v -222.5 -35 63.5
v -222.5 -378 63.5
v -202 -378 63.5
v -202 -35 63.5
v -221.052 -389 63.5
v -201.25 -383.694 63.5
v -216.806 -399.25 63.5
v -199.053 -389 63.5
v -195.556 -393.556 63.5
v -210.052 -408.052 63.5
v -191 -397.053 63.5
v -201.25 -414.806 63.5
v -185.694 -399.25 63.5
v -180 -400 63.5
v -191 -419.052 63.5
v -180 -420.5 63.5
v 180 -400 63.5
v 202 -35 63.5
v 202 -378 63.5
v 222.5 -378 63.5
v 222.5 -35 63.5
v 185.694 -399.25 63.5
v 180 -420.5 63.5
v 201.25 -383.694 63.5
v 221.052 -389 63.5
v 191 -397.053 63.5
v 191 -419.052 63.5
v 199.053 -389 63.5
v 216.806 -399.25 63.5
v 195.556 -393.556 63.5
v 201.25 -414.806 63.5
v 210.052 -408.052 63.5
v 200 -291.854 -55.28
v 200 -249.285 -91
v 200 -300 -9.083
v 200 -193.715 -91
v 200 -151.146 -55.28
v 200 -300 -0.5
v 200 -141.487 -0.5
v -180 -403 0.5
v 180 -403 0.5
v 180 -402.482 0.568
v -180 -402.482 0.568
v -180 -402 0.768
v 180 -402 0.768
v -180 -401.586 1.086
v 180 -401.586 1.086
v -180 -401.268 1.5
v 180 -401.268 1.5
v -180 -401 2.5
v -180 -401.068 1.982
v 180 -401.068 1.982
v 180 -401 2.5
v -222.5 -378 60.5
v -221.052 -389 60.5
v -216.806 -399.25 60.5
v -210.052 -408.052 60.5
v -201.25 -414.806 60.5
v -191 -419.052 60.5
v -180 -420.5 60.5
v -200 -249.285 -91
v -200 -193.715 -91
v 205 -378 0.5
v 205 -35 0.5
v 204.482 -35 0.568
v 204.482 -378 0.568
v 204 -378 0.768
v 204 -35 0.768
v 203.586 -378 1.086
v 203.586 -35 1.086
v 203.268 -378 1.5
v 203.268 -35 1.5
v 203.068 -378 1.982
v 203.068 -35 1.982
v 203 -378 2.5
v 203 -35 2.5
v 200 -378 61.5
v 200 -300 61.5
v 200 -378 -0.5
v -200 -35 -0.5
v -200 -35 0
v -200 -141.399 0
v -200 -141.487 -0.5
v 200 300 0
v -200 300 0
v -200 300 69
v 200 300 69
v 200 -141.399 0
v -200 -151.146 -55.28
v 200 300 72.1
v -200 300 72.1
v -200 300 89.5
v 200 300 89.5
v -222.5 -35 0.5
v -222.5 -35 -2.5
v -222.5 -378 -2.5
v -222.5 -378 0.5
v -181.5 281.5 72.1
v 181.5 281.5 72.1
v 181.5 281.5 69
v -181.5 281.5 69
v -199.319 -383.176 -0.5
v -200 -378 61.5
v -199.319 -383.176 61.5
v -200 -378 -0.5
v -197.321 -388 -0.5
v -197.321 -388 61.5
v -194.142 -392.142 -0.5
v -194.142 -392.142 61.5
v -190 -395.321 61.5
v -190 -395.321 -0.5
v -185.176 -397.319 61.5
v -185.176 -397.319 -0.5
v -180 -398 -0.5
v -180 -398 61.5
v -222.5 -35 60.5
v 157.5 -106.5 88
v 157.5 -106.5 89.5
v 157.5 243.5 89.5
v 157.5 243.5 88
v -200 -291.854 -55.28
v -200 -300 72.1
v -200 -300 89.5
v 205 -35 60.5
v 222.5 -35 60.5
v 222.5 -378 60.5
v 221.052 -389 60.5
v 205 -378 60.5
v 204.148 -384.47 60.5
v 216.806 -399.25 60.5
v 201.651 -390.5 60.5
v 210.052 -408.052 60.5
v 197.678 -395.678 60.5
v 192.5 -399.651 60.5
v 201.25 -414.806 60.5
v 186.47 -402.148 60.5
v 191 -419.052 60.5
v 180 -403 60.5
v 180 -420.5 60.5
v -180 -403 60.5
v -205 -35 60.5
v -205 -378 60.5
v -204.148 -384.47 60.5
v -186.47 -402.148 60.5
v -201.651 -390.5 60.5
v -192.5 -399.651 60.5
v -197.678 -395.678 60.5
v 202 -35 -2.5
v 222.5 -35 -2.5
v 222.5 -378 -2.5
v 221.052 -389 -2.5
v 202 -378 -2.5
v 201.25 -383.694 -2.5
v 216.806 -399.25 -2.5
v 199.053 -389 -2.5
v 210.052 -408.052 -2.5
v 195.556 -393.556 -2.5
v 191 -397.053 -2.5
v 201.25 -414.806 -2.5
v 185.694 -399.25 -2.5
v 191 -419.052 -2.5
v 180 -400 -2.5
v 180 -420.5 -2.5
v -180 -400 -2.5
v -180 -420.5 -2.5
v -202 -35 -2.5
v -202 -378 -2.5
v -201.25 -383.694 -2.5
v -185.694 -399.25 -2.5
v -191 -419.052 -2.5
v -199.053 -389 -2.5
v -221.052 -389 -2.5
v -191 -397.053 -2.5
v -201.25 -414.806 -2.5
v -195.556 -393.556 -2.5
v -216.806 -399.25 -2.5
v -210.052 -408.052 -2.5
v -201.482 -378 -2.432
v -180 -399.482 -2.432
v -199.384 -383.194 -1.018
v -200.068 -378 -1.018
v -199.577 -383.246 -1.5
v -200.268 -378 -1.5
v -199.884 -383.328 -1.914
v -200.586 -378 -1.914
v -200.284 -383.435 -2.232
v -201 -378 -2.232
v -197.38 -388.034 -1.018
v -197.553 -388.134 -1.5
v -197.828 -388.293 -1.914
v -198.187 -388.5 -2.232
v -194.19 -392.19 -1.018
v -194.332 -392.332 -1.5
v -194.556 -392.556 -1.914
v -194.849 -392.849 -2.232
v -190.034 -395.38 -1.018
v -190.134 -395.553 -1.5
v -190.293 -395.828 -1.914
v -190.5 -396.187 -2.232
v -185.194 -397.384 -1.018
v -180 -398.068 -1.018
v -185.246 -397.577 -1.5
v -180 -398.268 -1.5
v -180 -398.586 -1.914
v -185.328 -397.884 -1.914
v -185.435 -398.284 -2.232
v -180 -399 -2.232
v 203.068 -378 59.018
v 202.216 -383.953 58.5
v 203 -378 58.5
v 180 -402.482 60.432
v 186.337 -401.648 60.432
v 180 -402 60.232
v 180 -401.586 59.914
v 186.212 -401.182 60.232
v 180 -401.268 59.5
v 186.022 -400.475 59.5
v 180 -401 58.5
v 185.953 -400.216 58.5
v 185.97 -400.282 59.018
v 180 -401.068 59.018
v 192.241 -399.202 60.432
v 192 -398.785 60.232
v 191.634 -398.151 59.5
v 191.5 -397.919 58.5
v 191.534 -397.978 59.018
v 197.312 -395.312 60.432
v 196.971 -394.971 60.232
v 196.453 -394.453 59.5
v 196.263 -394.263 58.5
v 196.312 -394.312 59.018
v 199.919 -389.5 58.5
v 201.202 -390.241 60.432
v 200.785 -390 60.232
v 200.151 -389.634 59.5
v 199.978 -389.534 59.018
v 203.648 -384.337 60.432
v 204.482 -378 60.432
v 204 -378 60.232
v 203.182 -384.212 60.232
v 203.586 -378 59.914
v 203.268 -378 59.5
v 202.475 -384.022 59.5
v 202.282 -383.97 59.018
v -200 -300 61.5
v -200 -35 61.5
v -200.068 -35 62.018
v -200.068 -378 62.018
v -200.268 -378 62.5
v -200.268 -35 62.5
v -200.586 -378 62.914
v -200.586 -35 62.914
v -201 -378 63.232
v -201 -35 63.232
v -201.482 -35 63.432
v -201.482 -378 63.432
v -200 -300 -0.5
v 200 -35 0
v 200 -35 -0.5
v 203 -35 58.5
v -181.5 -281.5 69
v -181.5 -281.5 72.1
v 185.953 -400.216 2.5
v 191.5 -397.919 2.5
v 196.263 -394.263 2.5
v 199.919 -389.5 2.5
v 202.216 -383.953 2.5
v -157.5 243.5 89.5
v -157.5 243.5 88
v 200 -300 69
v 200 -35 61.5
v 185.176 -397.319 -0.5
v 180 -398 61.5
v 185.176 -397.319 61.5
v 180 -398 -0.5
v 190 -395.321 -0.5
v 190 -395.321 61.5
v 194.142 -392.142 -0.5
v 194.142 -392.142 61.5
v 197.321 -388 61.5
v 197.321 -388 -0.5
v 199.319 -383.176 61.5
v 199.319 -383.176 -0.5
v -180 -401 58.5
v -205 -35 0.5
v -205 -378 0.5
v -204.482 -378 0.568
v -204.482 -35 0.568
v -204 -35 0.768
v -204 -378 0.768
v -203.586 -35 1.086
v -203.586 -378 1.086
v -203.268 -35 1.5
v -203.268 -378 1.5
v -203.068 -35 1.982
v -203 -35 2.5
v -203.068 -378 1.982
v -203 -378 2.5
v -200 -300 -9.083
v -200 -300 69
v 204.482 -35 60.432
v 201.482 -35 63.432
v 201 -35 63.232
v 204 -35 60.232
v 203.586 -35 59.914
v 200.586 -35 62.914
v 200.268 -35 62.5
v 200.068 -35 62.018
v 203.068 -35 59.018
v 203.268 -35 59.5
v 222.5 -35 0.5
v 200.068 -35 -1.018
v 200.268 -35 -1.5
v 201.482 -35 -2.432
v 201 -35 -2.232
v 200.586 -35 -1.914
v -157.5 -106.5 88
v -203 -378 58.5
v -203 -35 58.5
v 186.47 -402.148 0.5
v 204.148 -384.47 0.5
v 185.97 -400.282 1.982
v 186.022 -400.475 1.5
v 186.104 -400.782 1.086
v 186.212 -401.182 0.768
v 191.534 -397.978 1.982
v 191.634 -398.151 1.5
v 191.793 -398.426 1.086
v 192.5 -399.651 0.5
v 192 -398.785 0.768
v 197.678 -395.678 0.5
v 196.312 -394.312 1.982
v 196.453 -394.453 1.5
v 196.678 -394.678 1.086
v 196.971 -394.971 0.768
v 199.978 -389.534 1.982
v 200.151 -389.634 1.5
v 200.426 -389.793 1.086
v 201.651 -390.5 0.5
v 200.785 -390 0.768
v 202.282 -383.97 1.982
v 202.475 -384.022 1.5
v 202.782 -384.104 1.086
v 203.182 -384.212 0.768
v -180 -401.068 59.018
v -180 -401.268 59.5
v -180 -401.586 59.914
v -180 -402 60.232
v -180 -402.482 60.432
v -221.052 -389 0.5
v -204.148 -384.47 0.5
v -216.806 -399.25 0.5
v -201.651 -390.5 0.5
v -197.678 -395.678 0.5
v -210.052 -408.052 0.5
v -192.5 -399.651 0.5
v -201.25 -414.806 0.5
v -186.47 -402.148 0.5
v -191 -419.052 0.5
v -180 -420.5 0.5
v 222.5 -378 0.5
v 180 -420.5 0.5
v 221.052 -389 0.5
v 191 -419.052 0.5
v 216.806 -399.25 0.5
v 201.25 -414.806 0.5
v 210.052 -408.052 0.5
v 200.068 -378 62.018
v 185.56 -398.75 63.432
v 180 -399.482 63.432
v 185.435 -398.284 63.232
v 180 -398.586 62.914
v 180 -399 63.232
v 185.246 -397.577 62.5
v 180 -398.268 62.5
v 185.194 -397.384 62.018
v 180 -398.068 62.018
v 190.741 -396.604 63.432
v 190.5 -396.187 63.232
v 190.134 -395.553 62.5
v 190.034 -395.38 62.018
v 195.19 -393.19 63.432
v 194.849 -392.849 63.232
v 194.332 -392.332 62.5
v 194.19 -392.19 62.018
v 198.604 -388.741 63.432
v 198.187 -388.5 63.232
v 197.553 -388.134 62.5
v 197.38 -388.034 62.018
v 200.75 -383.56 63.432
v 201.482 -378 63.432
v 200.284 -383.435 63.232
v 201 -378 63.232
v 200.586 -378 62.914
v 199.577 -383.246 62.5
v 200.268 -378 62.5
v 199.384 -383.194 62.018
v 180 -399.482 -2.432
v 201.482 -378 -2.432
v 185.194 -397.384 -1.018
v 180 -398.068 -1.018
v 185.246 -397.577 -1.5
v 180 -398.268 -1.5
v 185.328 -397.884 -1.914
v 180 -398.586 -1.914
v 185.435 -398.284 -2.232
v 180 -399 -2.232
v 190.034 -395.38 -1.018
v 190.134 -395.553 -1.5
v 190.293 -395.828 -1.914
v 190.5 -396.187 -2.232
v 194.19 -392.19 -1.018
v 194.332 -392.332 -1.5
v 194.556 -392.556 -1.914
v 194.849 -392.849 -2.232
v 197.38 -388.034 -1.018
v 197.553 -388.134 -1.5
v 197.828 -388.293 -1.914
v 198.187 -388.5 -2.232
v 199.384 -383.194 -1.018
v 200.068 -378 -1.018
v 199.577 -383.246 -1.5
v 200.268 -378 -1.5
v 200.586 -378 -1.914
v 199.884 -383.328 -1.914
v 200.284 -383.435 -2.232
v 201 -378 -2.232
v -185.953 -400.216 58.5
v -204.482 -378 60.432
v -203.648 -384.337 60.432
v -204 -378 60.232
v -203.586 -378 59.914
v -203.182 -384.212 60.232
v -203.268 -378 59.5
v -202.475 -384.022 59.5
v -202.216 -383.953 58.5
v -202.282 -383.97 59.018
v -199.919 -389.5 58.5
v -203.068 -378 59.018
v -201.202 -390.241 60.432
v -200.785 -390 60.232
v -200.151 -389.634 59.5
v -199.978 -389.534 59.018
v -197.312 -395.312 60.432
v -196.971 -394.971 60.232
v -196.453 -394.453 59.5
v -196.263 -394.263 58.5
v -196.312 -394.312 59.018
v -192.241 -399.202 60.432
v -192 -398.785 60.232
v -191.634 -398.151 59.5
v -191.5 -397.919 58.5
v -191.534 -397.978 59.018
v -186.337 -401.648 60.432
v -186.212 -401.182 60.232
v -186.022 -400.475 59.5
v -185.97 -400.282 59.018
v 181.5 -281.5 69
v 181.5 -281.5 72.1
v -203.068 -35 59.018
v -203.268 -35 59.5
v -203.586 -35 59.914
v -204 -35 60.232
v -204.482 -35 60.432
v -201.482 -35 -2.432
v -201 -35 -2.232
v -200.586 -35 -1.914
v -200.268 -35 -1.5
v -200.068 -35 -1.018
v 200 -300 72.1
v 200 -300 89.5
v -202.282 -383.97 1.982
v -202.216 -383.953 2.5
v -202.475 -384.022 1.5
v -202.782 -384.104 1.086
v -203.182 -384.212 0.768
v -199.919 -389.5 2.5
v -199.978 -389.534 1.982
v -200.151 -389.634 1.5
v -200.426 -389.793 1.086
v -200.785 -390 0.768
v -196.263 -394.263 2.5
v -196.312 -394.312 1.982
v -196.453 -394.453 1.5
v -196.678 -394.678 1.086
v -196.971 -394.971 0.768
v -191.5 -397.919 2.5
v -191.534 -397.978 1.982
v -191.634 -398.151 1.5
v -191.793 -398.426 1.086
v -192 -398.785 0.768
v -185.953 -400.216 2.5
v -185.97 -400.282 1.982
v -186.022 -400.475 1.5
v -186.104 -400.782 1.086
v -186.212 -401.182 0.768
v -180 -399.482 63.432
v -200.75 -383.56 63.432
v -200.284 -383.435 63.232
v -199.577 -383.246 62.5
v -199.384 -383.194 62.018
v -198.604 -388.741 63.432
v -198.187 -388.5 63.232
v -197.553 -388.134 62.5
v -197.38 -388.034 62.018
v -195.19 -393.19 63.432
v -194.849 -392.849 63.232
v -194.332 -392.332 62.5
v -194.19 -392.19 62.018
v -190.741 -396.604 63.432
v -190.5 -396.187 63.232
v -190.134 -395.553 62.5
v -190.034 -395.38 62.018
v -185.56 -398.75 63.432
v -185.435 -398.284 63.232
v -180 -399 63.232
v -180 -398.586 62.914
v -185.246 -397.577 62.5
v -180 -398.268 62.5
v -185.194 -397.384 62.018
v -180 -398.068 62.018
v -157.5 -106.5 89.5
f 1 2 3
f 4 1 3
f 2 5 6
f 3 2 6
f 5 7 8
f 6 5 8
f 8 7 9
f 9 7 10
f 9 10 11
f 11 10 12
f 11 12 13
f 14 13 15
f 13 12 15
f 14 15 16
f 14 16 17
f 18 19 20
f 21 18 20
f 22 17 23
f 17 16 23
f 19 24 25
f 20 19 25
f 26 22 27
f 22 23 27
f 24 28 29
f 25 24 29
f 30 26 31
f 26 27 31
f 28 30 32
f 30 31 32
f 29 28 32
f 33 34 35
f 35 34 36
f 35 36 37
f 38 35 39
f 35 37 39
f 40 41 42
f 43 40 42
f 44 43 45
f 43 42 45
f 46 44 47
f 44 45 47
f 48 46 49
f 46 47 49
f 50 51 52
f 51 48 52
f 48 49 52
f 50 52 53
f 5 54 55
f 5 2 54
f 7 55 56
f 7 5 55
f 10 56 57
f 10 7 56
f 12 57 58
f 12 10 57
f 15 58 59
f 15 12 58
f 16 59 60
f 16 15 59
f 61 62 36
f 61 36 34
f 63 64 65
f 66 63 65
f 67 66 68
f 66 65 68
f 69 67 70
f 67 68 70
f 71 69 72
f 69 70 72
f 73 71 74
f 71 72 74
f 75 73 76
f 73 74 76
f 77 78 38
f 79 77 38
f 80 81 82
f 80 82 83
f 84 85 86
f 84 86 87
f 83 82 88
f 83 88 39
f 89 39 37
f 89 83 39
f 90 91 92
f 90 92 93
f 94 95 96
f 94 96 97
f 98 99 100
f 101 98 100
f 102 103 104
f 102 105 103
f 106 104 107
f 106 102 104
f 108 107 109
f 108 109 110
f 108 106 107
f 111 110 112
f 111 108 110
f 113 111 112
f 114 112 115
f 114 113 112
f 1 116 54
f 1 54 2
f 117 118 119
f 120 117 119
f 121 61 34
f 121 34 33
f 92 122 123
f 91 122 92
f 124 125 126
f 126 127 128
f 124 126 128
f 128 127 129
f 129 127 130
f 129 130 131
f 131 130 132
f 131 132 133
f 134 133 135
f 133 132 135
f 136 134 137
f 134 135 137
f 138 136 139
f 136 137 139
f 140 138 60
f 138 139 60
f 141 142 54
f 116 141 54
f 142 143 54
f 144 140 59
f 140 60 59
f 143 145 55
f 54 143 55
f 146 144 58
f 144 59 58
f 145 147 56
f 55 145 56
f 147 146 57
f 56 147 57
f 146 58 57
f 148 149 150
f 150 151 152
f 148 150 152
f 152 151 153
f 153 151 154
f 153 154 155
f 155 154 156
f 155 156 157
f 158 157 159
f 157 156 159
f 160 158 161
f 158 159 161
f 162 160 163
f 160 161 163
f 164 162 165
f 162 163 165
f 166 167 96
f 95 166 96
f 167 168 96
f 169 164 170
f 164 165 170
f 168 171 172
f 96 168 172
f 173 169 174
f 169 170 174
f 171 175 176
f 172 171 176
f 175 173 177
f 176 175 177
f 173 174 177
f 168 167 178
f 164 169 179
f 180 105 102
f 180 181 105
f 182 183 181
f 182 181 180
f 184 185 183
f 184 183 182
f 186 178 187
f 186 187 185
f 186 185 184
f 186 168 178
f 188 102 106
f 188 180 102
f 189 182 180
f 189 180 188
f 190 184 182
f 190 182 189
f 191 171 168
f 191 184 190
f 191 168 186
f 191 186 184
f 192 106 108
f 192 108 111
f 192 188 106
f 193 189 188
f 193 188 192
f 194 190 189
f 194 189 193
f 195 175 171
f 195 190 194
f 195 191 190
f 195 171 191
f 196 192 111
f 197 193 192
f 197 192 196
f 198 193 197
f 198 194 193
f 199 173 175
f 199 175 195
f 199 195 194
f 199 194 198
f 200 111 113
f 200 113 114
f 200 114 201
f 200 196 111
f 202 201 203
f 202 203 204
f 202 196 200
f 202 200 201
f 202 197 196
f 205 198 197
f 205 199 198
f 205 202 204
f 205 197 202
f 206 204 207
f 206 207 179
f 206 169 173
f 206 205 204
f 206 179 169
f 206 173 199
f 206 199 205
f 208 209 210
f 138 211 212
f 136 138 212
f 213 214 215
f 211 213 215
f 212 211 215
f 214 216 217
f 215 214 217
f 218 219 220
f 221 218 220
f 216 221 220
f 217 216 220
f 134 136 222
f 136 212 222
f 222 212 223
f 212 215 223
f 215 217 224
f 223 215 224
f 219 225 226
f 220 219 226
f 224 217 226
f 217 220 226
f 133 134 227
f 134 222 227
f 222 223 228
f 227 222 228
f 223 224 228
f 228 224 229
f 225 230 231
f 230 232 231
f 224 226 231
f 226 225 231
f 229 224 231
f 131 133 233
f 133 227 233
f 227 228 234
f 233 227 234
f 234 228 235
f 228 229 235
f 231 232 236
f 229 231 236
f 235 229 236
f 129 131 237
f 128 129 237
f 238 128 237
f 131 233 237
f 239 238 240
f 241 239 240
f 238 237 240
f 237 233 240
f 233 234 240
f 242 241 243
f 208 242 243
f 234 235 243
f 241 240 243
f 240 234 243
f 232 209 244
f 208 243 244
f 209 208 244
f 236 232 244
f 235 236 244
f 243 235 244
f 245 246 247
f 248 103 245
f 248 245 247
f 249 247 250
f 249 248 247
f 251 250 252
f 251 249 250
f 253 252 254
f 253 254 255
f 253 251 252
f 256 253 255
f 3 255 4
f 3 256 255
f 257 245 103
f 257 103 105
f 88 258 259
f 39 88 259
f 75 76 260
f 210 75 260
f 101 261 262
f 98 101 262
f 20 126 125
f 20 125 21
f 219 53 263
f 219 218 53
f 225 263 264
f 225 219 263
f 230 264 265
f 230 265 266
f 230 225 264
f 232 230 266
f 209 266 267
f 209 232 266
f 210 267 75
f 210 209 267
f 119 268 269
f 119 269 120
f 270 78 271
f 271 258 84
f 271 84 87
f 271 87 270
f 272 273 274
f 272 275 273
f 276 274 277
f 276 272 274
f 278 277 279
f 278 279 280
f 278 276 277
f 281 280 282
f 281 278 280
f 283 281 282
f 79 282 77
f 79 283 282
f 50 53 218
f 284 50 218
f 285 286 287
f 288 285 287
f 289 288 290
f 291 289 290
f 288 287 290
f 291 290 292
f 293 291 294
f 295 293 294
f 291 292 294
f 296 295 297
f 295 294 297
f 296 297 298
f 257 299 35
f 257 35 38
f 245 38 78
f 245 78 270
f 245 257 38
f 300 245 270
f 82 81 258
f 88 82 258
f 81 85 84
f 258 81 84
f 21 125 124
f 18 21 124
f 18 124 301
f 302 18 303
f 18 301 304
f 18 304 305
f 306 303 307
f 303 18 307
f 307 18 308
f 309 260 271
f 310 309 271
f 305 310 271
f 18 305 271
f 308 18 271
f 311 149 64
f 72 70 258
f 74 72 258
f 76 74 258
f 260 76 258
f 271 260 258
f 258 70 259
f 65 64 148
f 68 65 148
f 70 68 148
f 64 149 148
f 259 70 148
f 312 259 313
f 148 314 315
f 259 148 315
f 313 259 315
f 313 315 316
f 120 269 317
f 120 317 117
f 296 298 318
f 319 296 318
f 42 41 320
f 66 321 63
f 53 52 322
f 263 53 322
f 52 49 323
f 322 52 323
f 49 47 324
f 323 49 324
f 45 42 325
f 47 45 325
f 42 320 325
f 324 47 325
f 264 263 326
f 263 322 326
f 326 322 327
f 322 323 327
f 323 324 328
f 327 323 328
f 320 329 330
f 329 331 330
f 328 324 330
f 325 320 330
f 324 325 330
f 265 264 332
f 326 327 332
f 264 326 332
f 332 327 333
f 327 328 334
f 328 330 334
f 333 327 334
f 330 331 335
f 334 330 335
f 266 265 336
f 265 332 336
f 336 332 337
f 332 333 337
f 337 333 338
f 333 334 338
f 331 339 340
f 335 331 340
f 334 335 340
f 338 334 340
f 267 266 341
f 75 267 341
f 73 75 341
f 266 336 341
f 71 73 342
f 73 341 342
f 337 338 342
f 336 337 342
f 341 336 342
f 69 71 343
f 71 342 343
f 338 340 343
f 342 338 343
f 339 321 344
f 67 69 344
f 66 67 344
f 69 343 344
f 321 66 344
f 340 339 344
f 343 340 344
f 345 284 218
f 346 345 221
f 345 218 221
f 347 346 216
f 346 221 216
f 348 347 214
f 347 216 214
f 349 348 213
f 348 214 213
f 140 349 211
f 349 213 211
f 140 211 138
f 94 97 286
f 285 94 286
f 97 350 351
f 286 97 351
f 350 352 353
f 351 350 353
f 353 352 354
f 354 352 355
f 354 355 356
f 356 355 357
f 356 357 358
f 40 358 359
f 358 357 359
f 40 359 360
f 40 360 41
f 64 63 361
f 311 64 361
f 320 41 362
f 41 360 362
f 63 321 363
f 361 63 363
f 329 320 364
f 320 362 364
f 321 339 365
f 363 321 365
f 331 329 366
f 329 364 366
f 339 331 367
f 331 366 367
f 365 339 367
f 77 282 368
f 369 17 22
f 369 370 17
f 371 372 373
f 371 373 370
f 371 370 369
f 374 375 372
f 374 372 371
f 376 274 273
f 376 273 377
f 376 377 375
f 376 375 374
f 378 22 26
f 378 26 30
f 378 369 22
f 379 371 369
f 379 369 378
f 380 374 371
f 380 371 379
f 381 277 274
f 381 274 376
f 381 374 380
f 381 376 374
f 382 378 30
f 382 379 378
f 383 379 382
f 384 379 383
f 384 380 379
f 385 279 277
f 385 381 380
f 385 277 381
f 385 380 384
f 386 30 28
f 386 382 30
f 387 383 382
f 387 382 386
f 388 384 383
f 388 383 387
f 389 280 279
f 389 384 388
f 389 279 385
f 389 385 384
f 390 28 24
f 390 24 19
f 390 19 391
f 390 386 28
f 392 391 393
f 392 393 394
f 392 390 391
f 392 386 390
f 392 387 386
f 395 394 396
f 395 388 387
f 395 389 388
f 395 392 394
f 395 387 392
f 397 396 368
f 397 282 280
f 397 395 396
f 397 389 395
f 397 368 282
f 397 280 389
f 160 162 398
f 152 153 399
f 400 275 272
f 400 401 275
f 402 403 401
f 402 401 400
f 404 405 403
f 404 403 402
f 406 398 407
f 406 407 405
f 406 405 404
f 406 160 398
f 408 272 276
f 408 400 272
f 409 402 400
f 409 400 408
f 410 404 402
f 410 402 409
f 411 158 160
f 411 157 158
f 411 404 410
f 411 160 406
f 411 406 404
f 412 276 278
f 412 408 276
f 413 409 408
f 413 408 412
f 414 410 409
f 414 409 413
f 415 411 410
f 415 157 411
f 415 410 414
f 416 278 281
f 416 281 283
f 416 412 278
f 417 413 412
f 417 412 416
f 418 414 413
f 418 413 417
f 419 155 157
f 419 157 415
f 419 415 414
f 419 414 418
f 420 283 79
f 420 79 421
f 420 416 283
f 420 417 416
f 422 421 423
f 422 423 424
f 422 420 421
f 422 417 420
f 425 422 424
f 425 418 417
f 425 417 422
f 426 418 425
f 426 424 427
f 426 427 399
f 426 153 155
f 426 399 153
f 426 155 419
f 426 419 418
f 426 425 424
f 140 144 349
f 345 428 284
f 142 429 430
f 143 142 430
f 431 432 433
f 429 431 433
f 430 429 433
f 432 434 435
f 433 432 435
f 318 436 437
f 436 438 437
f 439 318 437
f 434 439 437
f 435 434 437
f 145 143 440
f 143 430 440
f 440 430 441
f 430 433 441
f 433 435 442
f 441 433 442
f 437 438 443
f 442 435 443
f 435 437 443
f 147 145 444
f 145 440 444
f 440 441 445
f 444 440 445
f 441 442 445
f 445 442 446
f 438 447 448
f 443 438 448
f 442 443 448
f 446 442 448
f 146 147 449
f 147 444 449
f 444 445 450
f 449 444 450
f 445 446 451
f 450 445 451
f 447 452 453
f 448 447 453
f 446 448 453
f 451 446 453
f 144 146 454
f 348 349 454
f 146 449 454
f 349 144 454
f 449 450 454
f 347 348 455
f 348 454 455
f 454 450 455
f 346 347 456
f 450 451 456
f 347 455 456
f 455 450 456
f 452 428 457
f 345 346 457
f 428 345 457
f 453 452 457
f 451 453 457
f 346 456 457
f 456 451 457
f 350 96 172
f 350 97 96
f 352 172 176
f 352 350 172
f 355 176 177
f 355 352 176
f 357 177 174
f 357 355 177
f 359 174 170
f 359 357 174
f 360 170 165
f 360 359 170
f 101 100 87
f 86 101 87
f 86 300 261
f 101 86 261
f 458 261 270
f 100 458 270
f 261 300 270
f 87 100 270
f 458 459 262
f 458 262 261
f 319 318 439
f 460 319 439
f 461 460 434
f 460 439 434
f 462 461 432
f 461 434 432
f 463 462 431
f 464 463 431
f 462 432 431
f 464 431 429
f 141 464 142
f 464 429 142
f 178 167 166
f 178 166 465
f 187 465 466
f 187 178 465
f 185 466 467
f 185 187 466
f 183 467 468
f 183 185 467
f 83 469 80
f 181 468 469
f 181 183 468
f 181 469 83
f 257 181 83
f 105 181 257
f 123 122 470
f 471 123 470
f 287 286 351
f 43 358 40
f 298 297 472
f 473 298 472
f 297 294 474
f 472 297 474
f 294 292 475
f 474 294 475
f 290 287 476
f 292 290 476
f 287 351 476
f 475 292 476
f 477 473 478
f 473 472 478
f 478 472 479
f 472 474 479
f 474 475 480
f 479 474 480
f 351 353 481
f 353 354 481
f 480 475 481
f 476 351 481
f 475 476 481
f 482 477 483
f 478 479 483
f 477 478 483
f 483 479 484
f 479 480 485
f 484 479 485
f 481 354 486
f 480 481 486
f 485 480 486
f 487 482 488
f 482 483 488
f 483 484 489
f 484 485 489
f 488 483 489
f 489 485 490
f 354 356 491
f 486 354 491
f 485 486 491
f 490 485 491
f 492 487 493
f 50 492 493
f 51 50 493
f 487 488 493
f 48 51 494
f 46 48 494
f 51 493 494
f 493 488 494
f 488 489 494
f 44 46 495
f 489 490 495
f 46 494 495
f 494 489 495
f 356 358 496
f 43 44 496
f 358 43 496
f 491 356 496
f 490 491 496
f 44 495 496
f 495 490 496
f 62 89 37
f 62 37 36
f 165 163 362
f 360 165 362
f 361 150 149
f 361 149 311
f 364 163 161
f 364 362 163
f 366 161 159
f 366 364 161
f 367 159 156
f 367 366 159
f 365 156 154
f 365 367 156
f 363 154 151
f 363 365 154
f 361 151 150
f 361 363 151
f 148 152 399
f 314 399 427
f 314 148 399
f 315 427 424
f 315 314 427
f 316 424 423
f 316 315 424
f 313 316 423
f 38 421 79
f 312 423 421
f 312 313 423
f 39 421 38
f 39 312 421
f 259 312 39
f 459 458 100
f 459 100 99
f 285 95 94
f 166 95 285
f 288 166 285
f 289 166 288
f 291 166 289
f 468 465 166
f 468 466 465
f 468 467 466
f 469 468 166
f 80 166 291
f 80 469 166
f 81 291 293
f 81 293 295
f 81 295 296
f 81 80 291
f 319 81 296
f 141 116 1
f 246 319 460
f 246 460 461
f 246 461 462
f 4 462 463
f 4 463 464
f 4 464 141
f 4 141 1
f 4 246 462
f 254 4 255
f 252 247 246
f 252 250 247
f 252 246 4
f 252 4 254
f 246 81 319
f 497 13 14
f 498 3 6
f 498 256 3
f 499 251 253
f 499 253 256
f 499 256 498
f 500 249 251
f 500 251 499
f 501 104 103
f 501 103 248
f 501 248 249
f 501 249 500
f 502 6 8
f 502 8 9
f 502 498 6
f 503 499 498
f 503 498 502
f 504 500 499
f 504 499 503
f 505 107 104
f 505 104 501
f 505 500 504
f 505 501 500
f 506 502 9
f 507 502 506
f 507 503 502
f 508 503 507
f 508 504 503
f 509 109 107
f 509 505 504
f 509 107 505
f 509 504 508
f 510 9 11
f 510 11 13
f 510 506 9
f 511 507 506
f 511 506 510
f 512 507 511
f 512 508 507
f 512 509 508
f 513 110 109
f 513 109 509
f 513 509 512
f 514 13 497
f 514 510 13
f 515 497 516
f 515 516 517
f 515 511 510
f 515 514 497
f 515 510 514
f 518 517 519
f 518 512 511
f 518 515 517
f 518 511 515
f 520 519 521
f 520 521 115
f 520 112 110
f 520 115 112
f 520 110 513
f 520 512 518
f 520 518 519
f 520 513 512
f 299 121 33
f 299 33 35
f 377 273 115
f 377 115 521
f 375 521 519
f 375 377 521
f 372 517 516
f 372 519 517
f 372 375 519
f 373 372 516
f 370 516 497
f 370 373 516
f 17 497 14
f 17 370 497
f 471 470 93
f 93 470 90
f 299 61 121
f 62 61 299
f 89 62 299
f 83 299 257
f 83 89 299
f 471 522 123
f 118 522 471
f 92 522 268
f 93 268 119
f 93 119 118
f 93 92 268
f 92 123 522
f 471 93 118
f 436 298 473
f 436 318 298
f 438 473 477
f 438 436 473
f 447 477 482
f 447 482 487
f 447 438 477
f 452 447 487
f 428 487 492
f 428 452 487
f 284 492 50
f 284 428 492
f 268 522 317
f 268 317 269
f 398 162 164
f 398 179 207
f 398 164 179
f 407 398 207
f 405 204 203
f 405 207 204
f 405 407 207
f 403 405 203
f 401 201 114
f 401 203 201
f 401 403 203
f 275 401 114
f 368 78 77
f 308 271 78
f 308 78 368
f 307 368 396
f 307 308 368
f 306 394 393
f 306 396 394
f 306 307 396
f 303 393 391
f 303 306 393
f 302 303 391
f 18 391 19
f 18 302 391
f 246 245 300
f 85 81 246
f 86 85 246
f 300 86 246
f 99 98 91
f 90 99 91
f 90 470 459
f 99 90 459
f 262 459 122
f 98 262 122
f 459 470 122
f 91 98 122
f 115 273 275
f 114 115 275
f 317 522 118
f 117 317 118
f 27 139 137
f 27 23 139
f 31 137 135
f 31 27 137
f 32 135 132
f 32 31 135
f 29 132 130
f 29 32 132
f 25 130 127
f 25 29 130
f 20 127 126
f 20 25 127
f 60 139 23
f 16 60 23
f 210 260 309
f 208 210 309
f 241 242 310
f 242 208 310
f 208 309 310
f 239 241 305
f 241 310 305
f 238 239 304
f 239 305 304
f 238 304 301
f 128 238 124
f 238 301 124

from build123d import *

# Parameters (mm, degrees)
SKETCH1_W           = 400
SKETCH1_H           = 600
BOSS_EXTRUDE1_DEPTH = 89.5
SKETCH2_W           = 315
SKETCH2_H           = 350
CUT_EXTRUDE1_DEPTH  = 1.5
SKETCH3_W           = 18.5
SKETCH3_H           = 3.1
CUT_EXTRUDE2_DEPTH  = 600
SKETCH5_W           = 3.1
SKETCH5_H           = 18.5
CUT_EXTRUDE3_DEPTH  = 363
BOSS_EXTRUDE2_DEPTH = 400


with BuildPart() as part:
    # Sketch1 → Boss-Extrude1 (new body)
    with BuildSketch(Plane.XY):
        Rectangle(SKETCH1_W, SKETCH1_H)
    extrude(amount=BOSS_EXTRUDE1_DEPTH)

    # Sketch2 → Cut-Extrude1 (cut)
    with BuildSketch(Plane.XY.offset(89.5)):
        with Locations((0, 68.5)):
            Rectangle(SKETCH2_W, SKETCH2_H)
    extrude(amount=-CUT_EXTRUDE1_DEPTH, mode=Mode.SUBTRACT)

    # Sketch3 → Cut-Extrude2 (cut)
    with BuildSketch(Plane.XZ.offset(300)):
        with Locations((-190.75, 70.55)):
            Rectangle(SKETCH3_W, SKETCH3_H)
    cut_extrude2 = extrude(amount=-CUT_EXTRUDE2_DEPTH, mode=Mode.SUBTRACT)

    # Mirror1: Cut-Extrude2 across plane
    add(cut_extrude2.mirror(Plane(origin=(0, 0, 0), x_dir=(0, 0, 1), z_dir=(1, 0, 0))), mode=Mode.SUBTRACT)

    # Sketch5 → Cut-Extrude3 (cut)
    with BuildSketch(Plane(origin=(181.5, 0, 0), x_dir=(0, 0, -1), z_dir=(1, 0, 0))):
        with Locations((-70.55, -290.75)):
            Rectangle(SKETCH5_W, SKETCH5_H)
    cut_extrude3 = extrude(amount=-CUT_EXTRUDE3_DEPTH, mode=Mode.SUBTRACT)

    # Mirror2: Cut-Extrude3 across plane
    add(cut_extrude3.mirror(Plane.ZX), mode=Mode.SUBTRACT)

    # Sketch12 → Boss-Extrude2 (add)
    with BuildSketch(Plane.ZY.offset(200)):
        Polygon((-55.28029253, -151.145910296), (-91, -193.715), (-91, -249.285), (-55.28029253, -291.854089704), (-9.082539564, -300), (0, -300), (0, -141.398503221), align=None)
    extrude(amount=-BOSS_EXTRUDE2_DEPTH)

    # Sweep1: sweep along a path in Sketch11
    with BuildLine(Plane.XY) as sweep1_path:
        Line((-200, -35), (-200, -378))
        ThreePointArc((-200, -378), (-194.142135624, -392.142135624), (-180, -398))
        Line((-180, -398), (180, -398))
        ThreePointArc((180, -398), (194.142135624, -392.142135624), (200, -378))
        Line((200, -378), (200, -35))
    # Sketch10 → Sweep1 (sweep)
    with BuildSketch(Plane(origin=(0, -35, 0), x_dir=(1, 0, 0), z_dir=(0, 1, 0))):
        with BuildLine():
            Line((-200, 0.5), (-200, -61.5))
            ThreePointArc((-200, -61.5), (-200.585786438, -62.914213562), (-202, -63.5))
            Line((-202, -63.5), (-222.5, -63.5))
            Line((-222.5, -63.5), (-222.5, -60.5))
            Line((-222.5, -60.5), (-205, -60.5))
            ThreePointArc((-205, -60.5), (-203.585786438, -59.914213562), (-203, -58.5))
            Line((-203, -58.5), (-203, -2.5))
            ThreePointArc((-203, -2.5), (-203.585786438, -1.085786438), (-205, -0.5))
            Line((-205, -0.5), (-222.5, -0.5))
            Line((-222.5, -0.5), (-222.5, 2.5))
            Line((-222.5, 2.5), (-202, 2.5))
            ThreePointArc((-202, 2.5), (-200.585786438, 1.914213562), (-200, 0.5))
        make_face()
    sweep(path=sweep1_path.line)


solid = part.part
